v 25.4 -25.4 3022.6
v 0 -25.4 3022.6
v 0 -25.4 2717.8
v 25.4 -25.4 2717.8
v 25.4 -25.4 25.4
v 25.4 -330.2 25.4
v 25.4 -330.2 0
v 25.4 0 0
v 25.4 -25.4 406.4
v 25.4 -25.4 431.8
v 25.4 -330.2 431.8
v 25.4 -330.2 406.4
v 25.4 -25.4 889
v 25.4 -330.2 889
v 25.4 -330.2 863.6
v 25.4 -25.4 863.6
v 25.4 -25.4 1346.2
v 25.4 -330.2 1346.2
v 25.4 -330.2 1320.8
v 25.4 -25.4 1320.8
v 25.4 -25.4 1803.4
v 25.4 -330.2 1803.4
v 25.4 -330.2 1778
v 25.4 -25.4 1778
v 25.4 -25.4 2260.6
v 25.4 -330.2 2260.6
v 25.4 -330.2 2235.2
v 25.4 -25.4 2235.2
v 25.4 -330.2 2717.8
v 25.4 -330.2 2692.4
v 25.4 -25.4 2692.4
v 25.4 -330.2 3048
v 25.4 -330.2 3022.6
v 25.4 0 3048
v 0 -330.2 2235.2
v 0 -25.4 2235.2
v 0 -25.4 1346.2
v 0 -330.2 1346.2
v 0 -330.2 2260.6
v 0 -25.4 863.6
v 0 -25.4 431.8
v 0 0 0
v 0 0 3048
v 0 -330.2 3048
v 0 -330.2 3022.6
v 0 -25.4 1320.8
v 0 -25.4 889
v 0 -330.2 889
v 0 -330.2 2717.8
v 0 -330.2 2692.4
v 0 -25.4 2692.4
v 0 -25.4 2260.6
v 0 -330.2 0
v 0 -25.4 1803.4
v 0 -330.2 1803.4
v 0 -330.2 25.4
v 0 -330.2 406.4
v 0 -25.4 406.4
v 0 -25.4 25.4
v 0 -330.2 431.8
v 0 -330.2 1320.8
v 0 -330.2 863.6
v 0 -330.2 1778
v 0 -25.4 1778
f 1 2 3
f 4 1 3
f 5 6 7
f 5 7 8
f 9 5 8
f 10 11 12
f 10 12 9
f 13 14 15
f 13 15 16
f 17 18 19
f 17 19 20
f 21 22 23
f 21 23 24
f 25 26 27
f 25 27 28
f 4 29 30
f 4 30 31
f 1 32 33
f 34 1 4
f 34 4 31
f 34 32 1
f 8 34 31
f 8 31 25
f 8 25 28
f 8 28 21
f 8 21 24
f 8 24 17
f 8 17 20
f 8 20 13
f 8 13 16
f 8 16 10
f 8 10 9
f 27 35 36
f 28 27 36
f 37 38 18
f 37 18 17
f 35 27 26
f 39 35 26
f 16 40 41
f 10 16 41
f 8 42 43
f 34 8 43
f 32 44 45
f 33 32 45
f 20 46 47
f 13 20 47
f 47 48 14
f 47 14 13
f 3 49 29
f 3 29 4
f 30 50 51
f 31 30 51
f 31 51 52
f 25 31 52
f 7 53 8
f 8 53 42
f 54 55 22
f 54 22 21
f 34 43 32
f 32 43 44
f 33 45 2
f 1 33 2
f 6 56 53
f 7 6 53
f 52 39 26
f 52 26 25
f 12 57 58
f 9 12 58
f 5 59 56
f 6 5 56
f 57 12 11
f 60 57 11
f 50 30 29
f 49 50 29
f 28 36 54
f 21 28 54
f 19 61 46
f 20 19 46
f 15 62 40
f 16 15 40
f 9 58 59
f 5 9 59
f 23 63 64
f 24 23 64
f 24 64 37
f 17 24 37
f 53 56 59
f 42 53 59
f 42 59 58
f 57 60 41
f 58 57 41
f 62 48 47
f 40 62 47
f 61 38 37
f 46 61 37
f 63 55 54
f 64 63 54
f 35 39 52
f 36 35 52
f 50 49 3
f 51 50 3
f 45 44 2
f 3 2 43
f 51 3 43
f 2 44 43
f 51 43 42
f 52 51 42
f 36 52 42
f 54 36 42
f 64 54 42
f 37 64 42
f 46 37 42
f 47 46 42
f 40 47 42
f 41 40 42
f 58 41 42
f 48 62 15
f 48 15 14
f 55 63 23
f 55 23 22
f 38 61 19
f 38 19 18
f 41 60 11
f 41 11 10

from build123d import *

# Parameters (mm, degrees)
F0_W     = 304.8
F0_H     = 25.4
F1_DEPTH = 25.4


with BuildPart() as f1:
    # F0 (on Right) → F1 (new body)
    with BuildSketch(Plane.YZ):
        Polygon((0, 3048), (-330.2, 3048), (-330.2, 3022.6), (-25.4, 3022.6), (-25.4, 2717.8), (-25.4, 2692.4), (-25.4, 2260.6), (-25.4, 2235.2), (-25.4, 1803.4), (-25.4, 1778), (-25.4, 1346.2), (-25.4, 1320.8), (-25.4, 889), (-25.4, 863.6), (-25.4, 431.8), (-25.4, 406.4), (-25.4, 25.4), (-330.2, 25.4), (-330.2, 0), (0, 0), align=None)
        with Locations((-177.8, 2705.1)):
            Rectangle(F0_W, F0_H)
        with Locations((-177.8, 2247.9)):
            Rectangle(F0_W, F0_H)
        with Locations((-177.8, 419.1)):
            Rectangle(F0_W, F0_H)
        with Locations((-177.8, 1790.7)):
            Rectangle(F0_W, F0_H)
        with Locations((-177.8, 876.3)):
            Rectangle(F0_W, F0_H)
        with Locations((-177.8, 1333.5)):
            Rectangle(F0_W, F0_H)
    extrude(amount=F1_DEPTH)


solid = f1.part
